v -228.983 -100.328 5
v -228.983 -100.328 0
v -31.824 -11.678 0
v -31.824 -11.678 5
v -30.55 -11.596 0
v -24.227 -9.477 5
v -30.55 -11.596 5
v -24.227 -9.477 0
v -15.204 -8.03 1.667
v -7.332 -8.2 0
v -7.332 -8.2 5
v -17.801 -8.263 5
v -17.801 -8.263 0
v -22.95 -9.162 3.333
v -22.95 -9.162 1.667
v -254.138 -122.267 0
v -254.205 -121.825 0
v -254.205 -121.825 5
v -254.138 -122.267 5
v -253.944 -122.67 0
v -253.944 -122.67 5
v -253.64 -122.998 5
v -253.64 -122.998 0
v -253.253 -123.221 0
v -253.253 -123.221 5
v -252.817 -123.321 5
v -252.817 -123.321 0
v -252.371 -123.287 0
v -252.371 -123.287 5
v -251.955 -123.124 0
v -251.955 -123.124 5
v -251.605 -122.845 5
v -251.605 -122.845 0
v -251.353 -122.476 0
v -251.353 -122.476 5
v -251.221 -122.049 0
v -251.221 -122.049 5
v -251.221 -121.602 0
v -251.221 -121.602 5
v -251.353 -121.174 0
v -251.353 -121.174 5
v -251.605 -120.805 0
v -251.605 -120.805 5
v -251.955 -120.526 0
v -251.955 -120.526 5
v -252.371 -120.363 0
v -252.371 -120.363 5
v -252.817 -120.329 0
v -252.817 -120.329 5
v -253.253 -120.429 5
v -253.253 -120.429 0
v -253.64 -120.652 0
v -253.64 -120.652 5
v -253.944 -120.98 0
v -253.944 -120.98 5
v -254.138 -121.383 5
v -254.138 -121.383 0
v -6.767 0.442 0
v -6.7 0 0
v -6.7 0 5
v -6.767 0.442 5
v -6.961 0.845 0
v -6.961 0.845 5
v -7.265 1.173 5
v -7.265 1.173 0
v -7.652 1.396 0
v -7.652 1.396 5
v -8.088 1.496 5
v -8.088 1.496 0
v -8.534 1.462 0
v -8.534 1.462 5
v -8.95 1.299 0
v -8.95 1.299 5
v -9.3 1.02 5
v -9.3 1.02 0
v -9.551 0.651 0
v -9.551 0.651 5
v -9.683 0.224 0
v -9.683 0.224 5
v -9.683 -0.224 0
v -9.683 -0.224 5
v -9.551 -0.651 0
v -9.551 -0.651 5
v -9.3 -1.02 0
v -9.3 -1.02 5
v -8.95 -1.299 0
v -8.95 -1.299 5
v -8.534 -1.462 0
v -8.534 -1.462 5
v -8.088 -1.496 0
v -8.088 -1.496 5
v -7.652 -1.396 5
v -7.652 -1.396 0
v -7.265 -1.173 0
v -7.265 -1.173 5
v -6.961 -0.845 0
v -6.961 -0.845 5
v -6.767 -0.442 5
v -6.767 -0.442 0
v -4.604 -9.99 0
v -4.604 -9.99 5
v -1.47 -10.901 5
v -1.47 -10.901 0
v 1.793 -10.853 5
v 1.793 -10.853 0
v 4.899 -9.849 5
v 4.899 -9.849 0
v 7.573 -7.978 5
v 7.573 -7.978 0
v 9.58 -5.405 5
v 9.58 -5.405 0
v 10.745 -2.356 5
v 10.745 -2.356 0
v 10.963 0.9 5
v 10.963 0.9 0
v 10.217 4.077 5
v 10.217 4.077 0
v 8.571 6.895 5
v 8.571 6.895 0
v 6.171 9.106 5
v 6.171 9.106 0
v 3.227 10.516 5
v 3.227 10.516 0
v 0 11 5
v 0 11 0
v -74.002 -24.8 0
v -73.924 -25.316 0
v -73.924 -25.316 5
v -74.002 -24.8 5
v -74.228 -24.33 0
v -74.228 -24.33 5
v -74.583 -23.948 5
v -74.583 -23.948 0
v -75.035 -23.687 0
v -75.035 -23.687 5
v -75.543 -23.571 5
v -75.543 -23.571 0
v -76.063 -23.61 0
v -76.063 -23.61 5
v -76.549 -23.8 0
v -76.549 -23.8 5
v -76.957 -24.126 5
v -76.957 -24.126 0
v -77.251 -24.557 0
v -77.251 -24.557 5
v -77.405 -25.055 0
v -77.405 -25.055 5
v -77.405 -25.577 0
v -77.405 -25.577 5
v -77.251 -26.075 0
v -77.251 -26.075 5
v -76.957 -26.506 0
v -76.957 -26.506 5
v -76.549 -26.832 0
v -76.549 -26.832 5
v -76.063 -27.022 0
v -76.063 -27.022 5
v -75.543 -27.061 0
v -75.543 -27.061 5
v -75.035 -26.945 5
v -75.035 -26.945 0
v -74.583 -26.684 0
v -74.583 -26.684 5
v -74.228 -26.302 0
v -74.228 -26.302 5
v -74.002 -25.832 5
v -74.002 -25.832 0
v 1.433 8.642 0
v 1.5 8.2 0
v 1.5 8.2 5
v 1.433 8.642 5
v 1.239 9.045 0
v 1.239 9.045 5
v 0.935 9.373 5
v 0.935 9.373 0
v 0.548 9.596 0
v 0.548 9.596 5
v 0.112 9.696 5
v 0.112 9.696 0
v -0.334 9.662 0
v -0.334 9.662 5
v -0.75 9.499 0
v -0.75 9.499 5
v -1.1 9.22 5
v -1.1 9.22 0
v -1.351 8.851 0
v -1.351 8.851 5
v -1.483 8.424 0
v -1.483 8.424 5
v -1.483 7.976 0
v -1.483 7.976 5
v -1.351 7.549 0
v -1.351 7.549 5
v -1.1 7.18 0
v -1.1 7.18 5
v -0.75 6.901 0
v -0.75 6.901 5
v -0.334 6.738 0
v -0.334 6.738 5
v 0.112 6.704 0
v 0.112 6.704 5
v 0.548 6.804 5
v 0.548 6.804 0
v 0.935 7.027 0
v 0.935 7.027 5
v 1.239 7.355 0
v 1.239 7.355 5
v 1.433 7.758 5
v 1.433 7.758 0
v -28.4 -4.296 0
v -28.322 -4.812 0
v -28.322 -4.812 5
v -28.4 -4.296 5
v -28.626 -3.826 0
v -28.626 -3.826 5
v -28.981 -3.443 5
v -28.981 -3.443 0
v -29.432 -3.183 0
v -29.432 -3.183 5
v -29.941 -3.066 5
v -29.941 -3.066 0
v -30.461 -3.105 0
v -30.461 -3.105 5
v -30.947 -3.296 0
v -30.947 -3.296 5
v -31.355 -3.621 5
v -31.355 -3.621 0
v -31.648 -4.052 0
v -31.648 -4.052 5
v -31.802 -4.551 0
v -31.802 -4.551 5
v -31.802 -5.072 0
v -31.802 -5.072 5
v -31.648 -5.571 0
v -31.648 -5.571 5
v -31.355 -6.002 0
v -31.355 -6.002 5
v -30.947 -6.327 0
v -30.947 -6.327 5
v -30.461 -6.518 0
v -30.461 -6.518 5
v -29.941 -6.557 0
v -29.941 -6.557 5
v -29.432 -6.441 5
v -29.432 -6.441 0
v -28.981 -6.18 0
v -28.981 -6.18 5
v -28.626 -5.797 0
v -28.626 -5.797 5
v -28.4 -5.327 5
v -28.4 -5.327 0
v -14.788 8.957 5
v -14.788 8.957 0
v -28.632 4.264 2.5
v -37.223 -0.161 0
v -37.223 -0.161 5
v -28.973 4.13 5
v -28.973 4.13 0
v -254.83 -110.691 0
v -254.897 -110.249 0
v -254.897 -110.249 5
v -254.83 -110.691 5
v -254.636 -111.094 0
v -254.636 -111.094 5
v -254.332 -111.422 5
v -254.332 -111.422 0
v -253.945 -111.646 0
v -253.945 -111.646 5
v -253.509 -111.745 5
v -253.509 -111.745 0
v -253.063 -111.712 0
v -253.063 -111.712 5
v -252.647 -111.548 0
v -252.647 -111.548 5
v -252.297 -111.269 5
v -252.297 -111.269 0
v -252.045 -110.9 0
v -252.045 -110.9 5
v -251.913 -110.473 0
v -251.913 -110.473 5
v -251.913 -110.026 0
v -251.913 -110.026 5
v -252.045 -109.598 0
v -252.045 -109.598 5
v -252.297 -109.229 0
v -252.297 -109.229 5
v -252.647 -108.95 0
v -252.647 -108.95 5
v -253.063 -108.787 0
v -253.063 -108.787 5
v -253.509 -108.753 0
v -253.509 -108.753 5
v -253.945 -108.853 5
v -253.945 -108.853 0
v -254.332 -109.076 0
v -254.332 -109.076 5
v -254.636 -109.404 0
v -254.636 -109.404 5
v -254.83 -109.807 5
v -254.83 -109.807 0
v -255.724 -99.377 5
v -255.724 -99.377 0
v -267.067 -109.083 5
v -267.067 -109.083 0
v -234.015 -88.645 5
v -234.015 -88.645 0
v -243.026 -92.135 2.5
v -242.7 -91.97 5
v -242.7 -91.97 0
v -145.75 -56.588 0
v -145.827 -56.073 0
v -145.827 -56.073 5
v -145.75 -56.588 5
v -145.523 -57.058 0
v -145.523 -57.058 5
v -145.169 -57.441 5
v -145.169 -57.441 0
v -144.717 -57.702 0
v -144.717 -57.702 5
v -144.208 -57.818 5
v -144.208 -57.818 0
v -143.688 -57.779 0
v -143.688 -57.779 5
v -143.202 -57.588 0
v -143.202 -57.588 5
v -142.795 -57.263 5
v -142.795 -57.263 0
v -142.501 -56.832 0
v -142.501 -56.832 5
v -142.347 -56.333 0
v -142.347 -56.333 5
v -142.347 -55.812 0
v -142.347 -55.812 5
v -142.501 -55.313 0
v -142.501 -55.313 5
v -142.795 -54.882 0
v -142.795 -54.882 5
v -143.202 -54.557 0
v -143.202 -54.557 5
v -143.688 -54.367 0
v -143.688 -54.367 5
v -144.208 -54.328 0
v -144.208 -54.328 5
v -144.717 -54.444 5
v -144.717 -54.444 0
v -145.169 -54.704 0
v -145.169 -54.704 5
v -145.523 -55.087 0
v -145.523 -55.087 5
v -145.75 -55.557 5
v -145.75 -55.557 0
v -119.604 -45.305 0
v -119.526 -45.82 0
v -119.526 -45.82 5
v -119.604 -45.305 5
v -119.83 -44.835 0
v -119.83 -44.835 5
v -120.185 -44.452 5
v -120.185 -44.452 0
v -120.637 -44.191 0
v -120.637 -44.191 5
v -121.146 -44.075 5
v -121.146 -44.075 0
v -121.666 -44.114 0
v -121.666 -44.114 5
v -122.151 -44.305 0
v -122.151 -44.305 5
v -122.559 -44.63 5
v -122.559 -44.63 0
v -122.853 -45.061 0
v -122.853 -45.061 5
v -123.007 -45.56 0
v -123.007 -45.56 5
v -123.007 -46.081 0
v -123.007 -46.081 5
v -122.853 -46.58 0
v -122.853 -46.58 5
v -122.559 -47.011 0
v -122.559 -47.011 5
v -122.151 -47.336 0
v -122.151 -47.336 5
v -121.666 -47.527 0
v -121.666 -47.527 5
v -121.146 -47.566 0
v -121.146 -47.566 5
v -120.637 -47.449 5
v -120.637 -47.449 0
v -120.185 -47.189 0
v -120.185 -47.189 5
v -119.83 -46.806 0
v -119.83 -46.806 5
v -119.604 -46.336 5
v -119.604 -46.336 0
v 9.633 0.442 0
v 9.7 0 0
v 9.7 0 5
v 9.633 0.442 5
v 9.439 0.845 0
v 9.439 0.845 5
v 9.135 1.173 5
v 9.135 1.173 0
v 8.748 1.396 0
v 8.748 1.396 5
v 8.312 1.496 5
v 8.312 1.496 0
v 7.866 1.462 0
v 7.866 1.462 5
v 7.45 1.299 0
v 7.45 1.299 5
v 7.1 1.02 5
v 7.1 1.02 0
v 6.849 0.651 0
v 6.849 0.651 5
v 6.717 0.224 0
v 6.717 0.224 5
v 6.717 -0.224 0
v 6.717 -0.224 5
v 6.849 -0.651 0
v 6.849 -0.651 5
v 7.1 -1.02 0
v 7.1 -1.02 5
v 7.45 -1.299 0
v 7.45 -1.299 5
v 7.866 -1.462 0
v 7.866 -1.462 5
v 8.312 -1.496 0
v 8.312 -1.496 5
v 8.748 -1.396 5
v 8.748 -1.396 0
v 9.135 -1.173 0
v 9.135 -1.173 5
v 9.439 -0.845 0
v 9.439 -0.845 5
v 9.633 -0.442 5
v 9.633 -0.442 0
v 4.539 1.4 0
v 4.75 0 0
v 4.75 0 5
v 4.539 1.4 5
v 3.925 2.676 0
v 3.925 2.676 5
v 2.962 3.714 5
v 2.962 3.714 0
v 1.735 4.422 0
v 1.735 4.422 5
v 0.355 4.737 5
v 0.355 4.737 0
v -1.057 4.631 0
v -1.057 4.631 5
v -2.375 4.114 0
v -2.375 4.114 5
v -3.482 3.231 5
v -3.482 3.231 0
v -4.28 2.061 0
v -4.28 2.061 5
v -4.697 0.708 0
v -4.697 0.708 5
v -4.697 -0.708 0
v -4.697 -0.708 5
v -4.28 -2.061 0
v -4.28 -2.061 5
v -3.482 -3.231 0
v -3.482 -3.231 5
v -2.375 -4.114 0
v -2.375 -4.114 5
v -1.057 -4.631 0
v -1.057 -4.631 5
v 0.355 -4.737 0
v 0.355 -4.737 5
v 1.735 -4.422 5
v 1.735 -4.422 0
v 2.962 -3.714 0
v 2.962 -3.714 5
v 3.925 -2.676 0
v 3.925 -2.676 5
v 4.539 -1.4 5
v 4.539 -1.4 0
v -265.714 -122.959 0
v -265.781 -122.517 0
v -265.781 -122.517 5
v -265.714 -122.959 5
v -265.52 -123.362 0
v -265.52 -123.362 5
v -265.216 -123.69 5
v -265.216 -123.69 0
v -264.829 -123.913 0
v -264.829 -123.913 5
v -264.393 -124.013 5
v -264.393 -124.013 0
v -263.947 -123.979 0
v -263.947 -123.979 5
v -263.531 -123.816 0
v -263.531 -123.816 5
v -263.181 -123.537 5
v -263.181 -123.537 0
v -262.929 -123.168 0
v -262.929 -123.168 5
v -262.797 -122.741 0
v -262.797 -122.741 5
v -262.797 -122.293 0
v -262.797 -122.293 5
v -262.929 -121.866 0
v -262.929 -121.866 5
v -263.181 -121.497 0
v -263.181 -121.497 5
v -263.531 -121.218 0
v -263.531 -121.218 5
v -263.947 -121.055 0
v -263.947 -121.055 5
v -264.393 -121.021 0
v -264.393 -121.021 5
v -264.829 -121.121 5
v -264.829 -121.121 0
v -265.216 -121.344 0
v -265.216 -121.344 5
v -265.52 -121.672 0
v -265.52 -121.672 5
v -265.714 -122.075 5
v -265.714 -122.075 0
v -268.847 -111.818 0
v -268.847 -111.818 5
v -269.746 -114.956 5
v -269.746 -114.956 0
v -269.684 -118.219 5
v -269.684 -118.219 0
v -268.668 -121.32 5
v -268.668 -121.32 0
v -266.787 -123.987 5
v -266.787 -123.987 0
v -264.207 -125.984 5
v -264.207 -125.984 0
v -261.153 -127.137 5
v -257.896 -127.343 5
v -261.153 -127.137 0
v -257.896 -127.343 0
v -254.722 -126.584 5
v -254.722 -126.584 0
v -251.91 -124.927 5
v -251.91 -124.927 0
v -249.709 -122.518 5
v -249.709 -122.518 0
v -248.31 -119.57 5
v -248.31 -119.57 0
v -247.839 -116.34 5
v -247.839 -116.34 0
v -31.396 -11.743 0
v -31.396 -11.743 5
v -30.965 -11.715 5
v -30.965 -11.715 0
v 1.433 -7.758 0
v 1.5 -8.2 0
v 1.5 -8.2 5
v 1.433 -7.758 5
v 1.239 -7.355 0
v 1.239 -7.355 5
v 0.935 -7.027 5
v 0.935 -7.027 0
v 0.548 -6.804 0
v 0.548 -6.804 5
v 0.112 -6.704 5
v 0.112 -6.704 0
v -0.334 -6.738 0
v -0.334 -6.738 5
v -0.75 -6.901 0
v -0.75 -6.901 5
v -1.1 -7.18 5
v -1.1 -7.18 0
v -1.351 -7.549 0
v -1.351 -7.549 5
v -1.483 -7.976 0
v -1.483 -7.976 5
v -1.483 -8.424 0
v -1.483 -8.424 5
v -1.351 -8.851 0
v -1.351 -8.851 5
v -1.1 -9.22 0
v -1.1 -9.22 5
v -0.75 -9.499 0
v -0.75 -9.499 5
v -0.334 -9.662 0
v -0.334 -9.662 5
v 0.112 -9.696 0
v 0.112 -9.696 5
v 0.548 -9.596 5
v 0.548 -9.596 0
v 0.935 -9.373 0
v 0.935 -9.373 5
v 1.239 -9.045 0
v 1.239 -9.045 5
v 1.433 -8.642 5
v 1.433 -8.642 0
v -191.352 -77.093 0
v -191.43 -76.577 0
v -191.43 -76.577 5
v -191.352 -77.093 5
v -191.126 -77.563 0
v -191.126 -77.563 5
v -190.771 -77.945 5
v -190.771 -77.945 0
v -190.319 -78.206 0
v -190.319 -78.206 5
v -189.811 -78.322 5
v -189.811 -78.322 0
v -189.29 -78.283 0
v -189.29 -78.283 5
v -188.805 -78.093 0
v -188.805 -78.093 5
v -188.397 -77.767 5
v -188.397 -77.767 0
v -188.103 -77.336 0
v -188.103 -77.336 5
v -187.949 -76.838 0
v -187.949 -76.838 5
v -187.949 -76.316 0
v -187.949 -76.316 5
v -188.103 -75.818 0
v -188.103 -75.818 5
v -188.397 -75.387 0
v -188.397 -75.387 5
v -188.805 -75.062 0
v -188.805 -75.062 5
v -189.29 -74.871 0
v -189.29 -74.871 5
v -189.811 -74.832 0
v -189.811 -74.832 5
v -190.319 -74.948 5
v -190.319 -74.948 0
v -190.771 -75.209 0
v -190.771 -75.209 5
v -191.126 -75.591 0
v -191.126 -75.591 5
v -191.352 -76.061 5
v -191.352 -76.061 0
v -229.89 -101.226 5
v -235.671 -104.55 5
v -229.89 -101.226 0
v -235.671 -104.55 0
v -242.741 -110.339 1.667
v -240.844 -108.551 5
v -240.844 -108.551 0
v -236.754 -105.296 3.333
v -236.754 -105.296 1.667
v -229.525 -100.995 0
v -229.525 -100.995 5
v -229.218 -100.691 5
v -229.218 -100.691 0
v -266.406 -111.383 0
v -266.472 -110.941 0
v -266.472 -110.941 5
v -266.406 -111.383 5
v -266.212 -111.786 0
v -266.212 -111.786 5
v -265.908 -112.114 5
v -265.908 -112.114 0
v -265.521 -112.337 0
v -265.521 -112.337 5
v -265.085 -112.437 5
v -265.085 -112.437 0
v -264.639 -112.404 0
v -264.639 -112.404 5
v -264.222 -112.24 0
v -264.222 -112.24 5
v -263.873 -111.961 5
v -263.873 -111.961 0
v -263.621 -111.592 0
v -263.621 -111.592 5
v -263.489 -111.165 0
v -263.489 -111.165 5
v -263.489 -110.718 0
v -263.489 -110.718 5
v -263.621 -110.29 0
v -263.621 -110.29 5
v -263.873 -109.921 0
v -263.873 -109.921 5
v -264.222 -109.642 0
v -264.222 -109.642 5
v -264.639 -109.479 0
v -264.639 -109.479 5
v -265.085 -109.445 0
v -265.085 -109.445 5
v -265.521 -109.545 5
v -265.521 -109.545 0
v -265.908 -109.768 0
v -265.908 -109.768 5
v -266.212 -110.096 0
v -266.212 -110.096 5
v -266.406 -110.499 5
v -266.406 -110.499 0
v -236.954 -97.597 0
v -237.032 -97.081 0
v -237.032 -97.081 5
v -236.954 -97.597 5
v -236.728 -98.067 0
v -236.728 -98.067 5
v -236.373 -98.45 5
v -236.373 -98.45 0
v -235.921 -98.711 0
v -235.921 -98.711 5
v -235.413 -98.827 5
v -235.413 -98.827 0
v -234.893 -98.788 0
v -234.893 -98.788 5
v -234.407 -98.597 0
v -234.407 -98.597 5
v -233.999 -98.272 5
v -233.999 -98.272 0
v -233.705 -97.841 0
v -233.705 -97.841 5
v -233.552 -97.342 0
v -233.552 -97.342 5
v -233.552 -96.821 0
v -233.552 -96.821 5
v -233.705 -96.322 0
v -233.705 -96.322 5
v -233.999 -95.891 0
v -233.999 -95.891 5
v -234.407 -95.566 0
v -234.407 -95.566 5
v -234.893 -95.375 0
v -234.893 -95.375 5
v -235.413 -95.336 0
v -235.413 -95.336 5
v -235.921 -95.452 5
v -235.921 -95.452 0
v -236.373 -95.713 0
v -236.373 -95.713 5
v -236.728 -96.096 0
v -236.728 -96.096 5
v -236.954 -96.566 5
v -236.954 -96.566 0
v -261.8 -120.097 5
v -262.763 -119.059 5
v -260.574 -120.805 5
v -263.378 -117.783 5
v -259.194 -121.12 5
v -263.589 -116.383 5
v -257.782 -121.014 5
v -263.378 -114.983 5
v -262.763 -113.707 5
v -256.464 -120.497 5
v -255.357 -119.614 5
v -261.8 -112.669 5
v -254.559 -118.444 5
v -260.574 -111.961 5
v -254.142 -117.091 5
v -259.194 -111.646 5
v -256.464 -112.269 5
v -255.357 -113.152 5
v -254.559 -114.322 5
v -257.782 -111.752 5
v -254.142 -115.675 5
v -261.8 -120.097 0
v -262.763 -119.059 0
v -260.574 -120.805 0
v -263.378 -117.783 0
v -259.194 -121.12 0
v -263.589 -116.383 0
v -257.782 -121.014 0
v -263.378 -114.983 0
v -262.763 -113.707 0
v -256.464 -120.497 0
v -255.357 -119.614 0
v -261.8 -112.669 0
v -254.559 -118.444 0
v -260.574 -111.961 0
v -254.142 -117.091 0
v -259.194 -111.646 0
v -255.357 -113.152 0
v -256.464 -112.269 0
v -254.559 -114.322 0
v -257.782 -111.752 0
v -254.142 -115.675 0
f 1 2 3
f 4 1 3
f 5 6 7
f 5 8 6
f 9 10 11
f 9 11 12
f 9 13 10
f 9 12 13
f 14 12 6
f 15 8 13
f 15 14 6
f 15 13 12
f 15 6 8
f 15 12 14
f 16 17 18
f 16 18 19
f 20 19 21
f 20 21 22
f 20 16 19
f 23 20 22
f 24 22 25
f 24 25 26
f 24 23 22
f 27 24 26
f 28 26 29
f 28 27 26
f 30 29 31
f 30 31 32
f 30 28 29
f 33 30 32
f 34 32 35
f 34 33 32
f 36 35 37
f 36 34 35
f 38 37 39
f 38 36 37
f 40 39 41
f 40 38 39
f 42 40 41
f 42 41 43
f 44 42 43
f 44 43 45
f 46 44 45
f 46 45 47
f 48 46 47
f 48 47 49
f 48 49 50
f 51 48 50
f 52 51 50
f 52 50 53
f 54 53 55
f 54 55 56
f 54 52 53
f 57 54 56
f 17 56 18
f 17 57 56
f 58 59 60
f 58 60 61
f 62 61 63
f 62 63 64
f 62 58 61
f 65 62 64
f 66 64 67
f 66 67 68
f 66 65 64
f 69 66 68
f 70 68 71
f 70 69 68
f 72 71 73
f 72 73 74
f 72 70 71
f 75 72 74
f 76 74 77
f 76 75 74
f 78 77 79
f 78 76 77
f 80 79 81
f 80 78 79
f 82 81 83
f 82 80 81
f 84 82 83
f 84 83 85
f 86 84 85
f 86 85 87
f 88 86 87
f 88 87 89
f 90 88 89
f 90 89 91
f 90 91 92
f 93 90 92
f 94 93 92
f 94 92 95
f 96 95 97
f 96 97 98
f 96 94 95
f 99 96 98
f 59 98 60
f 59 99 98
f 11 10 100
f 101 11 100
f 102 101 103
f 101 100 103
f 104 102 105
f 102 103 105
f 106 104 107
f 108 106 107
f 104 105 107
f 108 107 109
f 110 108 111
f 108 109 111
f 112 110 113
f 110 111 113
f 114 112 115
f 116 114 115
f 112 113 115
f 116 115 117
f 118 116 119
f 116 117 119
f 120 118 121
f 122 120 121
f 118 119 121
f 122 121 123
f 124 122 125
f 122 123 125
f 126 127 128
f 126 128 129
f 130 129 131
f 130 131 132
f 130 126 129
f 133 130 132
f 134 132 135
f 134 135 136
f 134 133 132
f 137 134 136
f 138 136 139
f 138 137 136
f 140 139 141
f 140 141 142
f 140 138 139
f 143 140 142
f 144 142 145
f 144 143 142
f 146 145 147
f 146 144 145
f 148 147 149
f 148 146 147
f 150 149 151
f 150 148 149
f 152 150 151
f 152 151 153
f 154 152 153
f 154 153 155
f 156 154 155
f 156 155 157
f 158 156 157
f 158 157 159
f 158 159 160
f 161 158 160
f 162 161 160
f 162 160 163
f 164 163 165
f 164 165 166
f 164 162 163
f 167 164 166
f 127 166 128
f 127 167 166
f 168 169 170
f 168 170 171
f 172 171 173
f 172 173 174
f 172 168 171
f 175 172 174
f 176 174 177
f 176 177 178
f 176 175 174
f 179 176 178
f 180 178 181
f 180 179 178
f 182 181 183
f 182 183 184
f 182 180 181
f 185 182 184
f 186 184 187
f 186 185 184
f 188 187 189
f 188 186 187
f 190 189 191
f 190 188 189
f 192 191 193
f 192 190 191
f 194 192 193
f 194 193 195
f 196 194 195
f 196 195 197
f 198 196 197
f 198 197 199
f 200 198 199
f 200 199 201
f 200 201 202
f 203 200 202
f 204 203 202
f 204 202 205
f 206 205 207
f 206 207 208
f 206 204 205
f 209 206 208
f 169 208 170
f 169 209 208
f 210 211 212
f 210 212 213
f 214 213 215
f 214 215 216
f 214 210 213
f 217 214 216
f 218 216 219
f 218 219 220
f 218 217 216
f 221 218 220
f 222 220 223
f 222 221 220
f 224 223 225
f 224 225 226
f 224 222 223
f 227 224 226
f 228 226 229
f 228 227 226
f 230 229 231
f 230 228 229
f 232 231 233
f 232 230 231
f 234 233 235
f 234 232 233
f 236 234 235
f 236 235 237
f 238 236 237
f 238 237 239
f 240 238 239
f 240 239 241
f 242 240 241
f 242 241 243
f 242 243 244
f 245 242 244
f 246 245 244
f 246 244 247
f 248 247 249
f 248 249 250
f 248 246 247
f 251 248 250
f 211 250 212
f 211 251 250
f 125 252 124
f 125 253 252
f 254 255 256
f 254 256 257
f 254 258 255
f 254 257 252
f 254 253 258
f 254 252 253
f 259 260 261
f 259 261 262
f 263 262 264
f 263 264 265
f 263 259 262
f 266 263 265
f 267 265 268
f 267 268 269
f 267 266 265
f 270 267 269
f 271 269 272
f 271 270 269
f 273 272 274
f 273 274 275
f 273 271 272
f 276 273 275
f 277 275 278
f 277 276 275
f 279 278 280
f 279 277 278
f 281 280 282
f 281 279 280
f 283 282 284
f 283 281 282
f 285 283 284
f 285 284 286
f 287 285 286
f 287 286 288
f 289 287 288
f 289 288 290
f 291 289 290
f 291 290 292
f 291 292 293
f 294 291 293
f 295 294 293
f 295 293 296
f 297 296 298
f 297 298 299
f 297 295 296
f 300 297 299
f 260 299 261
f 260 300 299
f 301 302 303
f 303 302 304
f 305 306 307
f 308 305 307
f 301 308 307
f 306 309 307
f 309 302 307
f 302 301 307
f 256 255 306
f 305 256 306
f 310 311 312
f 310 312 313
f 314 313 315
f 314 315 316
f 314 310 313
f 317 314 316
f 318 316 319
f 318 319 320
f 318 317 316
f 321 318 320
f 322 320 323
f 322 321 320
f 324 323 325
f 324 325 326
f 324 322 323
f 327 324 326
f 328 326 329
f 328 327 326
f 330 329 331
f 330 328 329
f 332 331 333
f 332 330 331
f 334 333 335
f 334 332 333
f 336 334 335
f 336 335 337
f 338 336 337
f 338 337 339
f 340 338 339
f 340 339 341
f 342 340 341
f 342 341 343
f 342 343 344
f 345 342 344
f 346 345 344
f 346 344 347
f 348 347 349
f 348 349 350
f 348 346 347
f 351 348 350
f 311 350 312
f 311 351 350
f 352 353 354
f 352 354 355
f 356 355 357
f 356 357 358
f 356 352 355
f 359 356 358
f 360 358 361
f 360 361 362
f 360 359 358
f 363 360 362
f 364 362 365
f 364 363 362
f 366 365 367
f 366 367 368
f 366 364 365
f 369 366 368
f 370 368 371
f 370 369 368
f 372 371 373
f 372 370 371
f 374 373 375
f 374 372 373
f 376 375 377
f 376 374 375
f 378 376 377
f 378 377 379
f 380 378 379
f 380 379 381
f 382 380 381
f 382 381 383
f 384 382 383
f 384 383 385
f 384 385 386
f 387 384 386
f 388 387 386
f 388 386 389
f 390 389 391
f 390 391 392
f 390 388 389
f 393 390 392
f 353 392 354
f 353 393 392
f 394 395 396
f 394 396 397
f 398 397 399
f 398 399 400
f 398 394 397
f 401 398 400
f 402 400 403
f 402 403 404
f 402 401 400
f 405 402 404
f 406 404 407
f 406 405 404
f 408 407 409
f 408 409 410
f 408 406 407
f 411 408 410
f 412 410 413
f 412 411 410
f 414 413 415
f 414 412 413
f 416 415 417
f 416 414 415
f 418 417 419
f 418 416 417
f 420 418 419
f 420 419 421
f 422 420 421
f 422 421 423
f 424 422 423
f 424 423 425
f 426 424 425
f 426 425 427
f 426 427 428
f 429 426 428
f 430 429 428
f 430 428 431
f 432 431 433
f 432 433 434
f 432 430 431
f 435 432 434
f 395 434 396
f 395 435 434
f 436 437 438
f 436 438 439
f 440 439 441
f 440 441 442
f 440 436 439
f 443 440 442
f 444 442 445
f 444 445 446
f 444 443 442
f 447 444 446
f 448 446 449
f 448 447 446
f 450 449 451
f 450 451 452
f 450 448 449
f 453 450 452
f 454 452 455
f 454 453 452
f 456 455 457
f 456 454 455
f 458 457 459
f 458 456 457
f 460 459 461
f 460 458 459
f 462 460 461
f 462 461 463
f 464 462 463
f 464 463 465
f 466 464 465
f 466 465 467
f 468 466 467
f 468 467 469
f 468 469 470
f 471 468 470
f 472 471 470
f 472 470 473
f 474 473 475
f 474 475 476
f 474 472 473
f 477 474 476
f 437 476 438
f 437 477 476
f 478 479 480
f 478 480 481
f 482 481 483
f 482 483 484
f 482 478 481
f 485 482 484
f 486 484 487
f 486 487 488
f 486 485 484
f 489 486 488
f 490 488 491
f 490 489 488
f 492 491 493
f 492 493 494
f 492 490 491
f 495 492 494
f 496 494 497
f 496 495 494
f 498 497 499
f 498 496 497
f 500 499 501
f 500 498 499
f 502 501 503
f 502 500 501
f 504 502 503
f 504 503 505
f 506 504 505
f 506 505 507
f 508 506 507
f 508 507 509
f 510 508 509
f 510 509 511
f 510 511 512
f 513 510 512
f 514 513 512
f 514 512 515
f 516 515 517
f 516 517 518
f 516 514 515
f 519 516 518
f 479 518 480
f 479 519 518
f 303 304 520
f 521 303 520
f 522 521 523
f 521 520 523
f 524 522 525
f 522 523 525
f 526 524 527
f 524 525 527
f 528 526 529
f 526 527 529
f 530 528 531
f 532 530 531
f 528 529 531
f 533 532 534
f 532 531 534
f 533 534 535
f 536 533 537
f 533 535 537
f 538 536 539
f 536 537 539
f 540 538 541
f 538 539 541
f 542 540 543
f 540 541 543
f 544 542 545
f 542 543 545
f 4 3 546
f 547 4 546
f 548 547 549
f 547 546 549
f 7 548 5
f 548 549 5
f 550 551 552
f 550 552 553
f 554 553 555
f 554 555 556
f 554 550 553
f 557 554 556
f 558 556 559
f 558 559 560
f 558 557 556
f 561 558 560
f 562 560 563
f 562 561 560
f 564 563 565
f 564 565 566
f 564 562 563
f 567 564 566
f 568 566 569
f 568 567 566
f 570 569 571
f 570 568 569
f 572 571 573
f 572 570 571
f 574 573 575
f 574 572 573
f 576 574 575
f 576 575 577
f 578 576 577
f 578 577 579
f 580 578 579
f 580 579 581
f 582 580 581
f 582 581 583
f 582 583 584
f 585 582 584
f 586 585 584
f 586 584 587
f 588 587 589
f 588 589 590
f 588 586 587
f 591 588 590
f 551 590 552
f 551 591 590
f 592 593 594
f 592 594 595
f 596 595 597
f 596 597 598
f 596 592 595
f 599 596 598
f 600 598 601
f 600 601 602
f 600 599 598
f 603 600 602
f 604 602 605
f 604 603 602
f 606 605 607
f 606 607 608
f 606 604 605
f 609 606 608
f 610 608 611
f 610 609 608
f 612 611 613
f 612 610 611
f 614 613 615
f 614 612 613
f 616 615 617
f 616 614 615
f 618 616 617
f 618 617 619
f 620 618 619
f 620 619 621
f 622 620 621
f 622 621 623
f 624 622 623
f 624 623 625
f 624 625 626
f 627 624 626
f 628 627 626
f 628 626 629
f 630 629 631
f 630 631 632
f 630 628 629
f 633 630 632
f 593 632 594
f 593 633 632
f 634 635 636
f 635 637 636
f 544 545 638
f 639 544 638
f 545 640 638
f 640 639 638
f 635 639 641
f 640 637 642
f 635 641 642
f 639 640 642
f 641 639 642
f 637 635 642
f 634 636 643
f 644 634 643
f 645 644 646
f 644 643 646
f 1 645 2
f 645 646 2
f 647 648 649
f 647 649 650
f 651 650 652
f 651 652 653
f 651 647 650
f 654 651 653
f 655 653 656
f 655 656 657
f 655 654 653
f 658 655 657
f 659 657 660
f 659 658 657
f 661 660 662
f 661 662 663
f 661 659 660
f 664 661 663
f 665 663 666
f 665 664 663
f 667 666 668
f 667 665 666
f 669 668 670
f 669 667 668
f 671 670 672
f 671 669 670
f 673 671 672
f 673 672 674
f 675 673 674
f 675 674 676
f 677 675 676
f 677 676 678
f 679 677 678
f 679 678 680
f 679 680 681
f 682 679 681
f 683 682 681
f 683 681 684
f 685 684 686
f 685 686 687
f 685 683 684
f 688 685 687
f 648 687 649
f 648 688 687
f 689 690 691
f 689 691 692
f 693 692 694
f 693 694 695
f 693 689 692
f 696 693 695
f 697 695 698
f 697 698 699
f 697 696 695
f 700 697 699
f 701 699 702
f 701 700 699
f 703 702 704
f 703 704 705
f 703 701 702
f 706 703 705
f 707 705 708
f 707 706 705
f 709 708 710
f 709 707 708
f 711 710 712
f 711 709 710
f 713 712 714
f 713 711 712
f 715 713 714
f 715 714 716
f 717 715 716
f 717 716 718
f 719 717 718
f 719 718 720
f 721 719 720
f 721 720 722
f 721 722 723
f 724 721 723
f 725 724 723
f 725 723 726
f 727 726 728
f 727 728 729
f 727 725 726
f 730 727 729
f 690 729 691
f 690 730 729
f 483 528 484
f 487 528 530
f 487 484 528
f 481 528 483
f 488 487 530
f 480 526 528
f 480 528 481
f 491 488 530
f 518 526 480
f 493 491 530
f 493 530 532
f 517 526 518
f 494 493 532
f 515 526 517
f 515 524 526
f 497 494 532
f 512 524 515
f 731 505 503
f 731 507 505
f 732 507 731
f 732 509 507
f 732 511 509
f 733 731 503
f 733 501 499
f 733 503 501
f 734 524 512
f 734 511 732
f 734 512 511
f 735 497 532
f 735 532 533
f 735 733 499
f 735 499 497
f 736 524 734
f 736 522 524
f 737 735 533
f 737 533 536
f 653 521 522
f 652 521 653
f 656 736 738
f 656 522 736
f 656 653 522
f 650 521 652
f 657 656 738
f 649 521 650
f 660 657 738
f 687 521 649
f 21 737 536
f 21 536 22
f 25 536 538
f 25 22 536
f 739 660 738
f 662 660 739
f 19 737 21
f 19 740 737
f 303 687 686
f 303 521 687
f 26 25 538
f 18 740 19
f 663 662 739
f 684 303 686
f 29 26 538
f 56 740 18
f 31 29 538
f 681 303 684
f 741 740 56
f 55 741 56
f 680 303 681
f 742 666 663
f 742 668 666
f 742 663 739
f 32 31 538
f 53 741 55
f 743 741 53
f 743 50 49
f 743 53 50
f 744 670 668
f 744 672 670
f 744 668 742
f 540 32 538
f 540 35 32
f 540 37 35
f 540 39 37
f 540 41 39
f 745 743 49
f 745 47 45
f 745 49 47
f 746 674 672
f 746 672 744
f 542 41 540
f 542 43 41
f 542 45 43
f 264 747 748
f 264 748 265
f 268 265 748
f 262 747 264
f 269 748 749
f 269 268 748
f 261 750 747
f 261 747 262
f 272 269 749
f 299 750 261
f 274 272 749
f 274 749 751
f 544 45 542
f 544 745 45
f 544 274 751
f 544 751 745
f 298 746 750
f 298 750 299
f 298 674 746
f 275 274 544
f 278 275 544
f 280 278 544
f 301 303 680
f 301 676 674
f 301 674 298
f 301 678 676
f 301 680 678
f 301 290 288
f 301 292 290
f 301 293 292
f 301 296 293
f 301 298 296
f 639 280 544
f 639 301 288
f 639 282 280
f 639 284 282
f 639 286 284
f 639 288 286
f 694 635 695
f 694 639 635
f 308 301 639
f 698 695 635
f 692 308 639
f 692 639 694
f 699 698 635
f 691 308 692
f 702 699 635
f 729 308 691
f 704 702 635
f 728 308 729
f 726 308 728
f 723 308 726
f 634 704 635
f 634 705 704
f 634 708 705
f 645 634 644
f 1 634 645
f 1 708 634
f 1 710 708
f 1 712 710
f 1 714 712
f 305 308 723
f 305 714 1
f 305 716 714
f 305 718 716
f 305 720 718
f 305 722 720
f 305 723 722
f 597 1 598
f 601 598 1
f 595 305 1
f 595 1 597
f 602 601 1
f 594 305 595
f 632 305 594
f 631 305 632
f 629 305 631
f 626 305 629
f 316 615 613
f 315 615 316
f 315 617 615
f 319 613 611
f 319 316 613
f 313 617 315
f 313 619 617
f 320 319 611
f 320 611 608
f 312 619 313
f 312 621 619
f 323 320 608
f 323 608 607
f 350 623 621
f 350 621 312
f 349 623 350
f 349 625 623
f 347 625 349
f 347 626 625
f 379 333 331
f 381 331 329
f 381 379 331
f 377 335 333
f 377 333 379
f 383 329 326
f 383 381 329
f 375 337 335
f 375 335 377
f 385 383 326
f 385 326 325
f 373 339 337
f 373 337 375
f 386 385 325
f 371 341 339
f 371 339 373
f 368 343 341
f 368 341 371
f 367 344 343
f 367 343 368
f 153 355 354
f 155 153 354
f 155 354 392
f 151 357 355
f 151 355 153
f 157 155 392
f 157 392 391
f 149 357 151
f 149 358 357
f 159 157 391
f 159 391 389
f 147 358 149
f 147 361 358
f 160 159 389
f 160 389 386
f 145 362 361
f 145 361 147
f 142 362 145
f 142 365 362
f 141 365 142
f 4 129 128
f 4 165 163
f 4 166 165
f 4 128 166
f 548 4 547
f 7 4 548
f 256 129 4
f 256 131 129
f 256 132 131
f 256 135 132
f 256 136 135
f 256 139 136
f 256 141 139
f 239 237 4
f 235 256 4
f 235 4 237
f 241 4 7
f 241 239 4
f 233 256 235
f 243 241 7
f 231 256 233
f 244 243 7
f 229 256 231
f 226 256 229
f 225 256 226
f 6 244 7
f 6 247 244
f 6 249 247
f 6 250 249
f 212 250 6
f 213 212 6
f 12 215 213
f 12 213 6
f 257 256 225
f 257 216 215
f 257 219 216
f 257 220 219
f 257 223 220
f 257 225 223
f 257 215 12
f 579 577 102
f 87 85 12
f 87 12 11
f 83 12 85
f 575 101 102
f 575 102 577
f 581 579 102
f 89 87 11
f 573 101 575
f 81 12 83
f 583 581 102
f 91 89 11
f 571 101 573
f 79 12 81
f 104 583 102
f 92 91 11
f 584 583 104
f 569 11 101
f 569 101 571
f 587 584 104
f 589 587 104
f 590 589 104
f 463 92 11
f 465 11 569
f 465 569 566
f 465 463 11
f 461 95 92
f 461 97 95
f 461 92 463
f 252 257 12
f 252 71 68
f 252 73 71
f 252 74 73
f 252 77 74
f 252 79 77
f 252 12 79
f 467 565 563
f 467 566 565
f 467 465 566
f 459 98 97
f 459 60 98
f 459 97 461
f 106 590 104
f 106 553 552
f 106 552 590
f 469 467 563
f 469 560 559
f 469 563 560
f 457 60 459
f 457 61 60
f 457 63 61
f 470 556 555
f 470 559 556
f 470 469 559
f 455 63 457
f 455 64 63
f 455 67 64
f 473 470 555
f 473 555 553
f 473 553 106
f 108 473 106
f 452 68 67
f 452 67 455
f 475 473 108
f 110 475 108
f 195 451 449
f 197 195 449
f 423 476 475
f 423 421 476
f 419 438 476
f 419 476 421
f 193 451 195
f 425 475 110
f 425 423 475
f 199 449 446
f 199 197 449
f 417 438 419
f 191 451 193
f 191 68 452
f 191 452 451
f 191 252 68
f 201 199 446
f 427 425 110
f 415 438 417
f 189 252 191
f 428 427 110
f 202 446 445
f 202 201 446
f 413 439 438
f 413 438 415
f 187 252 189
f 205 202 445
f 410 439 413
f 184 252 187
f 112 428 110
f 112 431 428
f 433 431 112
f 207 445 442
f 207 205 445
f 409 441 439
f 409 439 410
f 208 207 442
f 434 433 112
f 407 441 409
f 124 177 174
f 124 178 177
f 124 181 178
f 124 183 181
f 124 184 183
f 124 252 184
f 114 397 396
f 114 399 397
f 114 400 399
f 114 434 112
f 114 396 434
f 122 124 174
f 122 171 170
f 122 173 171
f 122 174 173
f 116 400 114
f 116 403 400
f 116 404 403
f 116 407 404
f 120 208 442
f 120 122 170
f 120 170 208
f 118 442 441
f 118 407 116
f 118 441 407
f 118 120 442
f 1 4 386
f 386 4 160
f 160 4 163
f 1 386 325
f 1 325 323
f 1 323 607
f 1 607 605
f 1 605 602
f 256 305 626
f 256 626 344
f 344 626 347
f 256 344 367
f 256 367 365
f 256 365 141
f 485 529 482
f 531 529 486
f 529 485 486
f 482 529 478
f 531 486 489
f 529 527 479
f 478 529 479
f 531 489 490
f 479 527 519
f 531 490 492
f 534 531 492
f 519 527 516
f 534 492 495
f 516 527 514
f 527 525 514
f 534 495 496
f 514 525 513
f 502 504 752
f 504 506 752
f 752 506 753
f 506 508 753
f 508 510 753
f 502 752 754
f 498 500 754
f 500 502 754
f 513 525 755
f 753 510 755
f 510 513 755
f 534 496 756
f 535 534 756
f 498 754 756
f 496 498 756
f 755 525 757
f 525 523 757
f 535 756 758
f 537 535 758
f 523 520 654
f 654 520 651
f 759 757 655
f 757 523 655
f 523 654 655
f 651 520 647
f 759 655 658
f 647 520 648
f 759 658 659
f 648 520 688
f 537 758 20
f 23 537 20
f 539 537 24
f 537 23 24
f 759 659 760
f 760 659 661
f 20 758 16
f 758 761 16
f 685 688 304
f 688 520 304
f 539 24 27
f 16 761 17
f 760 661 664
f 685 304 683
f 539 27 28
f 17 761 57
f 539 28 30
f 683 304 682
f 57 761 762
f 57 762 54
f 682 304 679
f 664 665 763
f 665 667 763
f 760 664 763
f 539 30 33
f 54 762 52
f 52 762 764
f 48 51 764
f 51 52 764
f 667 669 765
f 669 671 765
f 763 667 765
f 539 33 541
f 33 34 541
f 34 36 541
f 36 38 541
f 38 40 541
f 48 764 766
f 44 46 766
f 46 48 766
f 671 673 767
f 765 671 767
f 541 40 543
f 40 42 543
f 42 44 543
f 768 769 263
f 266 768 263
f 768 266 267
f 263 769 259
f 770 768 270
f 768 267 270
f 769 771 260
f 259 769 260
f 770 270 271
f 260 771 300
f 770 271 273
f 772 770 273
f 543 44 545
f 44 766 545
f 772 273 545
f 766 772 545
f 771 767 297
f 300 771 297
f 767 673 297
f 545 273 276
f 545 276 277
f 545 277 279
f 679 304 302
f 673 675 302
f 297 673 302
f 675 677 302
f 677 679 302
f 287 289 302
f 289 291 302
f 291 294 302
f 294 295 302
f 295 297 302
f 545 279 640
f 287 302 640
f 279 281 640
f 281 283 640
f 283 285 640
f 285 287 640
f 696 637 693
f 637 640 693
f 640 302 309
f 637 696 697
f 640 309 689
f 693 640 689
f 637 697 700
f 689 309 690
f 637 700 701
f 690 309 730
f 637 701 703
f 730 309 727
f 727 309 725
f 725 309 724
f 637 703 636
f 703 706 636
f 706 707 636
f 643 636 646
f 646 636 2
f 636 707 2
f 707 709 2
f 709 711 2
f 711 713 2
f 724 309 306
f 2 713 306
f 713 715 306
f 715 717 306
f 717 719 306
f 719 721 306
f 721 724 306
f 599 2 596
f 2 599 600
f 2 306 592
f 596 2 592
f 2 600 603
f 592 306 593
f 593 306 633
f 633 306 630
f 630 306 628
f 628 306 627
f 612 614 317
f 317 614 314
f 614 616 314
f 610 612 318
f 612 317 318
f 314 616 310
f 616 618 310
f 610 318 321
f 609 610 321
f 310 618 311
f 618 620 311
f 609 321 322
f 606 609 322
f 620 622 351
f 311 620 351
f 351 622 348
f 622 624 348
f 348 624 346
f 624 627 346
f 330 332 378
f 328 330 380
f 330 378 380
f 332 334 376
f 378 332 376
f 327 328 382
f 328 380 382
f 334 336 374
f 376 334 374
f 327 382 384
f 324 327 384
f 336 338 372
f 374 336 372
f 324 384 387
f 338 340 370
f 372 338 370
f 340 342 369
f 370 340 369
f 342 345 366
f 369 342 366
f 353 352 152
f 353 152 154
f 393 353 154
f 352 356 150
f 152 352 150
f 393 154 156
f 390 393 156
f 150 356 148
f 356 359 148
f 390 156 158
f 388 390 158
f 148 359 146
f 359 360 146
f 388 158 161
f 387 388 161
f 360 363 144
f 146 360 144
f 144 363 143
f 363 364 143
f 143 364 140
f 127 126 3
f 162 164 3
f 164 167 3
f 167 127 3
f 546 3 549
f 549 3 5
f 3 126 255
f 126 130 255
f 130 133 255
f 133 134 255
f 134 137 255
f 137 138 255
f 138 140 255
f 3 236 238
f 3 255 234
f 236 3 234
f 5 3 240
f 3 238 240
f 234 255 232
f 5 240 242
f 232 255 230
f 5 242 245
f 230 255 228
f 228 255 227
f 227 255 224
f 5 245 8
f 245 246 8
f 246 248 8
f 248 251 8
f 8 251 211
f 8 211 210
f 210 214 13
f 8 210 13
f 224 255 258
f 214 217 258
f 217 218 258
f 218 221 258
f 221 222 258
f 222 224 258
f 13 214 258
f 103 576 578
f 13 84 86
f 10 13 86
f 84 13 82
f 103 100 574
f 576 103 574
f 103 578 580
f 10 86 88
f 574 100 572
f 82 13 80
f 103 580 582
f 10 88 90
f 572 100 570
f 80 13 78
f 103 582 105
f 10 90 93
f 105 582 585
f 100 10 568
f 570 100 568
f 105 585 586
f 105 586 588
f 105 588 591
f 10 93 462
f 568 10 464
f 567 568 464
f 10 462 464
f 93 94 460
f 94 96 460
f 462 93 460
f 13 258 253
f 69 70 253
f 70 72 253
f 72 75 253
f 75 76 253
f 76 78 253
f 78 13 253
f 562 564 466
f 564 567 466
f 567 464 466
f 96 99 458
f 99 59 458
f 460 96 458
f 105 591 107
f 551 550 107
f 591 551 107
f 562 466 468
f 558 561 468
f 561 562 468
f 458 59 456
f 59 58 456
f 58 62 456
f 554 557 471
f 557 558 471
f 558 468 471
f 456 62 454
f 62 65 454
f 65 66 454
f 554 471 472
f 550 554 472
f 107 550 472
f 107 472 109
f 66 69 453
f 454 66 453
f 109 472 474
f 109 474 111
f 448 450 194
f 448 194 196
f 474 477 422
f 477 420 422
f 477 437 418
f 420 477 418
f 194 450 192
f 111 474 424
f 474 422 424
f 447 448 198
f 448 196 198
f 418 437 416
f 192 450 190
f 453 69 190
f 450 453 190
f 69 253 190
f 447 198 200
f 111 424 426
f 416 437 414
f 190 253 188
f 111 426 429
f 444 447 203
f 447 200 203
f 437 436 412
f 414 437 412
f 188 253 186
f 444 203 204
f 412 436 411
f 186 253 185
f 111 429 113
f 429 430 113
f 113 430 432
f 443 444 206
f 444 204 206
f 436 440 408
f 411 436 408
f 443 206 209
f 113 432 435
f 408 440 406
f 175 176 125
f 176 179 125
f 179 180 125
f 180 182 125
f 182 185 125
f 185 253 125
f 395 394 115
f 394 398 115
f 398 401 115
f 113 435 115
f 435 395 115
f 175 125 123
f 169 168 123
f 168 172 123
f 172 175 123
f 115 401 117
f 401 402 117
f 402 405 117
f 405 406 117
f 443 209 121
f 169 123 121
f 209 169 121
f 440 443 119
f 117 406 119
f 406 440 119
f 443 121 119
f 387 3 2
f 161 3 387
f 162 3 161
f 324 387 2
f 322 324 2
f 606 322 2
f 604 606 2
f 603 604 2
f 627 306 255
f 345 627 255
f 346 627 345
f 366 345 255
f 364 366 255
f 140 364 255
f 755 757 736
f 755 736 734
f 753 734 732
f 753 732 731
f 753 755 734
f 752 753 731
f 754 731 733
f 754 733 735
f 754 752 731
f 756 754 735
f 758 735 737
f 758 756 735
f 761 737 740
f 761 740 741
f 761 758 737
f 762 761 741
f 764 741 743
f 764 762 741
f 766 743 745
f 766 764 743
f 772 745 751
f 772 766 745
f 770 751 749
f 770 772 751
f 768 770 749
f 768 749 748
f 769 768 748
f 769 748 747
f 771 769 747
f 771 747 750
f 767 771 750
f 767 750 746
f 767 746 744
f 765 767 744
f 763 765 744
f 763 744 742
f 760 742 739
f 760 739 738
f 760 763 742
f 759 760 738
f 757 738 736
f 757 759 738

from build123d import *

# Parameters (mm, degrees)
SKETCH1_R           = 1.5
SKETCH1_R_2         = 4.75
SKETCH1_R_3         = 1.75
BOSS_EXTRUDE1_DEPTH = 5


with BuildPart() as part:
    # Sketch1 → Boss-Extrude1 (new body)
    with BuildSketch(Plane.XY):
        with BuildLine():
            Line((-228.983312247, -100.327673659), (-31.823690309, -11.677627043))
            ThreePointArc((-31.823690309, -11.677627043), (-31.180096404, -11.740933542), (-30.549947196, -11.595562287))
            add(Edge.make_bspline(
                [(-7.332121112, -8.2), (-15.261701169, -7.378248506), (-23.028748322, -8.511718389), (-30.549947196, -11.595562287)],
                knots=[0, 0, 0, 0, 0.928485629, 0.928485629, 0.928485629, 0.928485629], degree=3))
            ThreePointArc((-7.332121112, -8.2), (10.276186063, -3.924283374), (0, 11))
            add(Edge.make_bspline(
                [(-37.223327458, -0.160922187), (-34.733241197, 1.803007777), (-22.33190483, 6.92754021), (-10.110124034, 10.988248808), (0, 11)],
                knots=[0.039876476, 0.039876476, 0.039876476, 0.039876476, 0.276467277, 1, 1, 1, 1], degree=3))
            Line((-37.223327458, -0.160922187), (-234.014760878, -88.645418023))
            add(Edge.make_bspline(
                [(-234.014760878, -88.645418023), (-237.136414749, -89.204727957), (-249.199971308, -95.080489992), (-260.348583277, -101.527949282), (-267.06700619, -109.08291716)],
                knots=[0.039876476, 0.039876476, 0.039876476, 0.039876476, 0.276467277, 1, 1, 1, 1], degree=3))
            ThreePointArc((-267.06700619, -109.08291716), (-262.722901285, -126.674477262), (-247.838660732, -116.340377524))
            add(Edge.make_bspline(
                [(-247.838660732, -116.340377524), (-243.190858822, -109.863383406), (-237.188340902, -104.805562326), (-229.890025639, -101.226020455)],
                knots=[0, 0, 0, 0, 0.928485629, 0.928485629, 0.928485629, 0.928485629], degree=3))
            ThreePointArc((-229.890025639, -101.226020455), (-229.363080717, -100.851120634), (-228.983312247, -100.327673659))
        make_face()
        with Locations((-8.2, 0)):
            Circle(SKETCH1_R, mode=Mode.SUBTRACT)
        with Locations((0, 8.2)):
            Circle(SKETCH1_R, mode=Mode.SUBTRACT)
        with Locations((0, -8.2)):
            Circle(SKETCH1_R, mode=Mode.SUBTRACT)
        with Locations((8.2, 0)):
            Circle(SKETCH1_R, mode=Mode.SUBTRACT)
        Circle(SKETCH1_R_2, mode=Mode.SUBTRACT)
        with Locations(Location((-258.838577689, -116.383120199, 0), (0, 0, 180))):
            Circle(SKETCH1_R_2, mode=Mode.SUBTRACT)
        with Locations(Location((-264.280547227, -122.517039627, 0), (0, 0, 180))):
            Circle(SKETCH1_R, mode=Mode.SUBTRACT)
        with Locations(Location((-252.704658261, -121.825089736, 0), (0, 0, 180))):
            Circle(SKETCH1_R, mode=Mode.SUBTRACT)
        with Locations(Location((-264.972497117, -110.941150661, 0), (0, 0, 180))):
            Circle(SKETCH1_R, mode=Mode.SUBTRACT)
        with Locations(Location((-253.396608151, -110.249200771, 0), (0, 0, 180))):
            Circle(SKETCH1_R, mode=Mode.SUBTRACT)
        with Locations((-75.674055251, -25.316000748)):
            Circle(SKETCH1_R_3, mode=Mode.SUBTRACT)
        with Locations((-30.071768827, -4.811575057)):
            Circle(SKETCH1_R_3, mode=Mode.SUBTRACT)
        with Locations((-121.276341675, -45.820426439)):
            Circle(SKETCH1_R_3, mode=Mode.SUBTRACT)
        with Locations(Location((-235.282057735, -97.081490667, 0), (0, 0, 180))):
            Circle(SKETCH1_R_3, mode=Mode.SUBTRACT)
        with Locations(Location((-189.679771311, -76.577064976, 0), (0, 0, 180))):
            Circle(SKETCH1_R_3, mode=Mode.SUBTRACT)
        with Locations(Location((-144.077484887, -56.072639285, 0), (0, 0, 180))):
            Circle(SKETCH1_R_3, mode=Mode.SUBTRACT)
    extrude(amount=BOSS_EXTRUDE1_DEPTH)


solid = part.part
